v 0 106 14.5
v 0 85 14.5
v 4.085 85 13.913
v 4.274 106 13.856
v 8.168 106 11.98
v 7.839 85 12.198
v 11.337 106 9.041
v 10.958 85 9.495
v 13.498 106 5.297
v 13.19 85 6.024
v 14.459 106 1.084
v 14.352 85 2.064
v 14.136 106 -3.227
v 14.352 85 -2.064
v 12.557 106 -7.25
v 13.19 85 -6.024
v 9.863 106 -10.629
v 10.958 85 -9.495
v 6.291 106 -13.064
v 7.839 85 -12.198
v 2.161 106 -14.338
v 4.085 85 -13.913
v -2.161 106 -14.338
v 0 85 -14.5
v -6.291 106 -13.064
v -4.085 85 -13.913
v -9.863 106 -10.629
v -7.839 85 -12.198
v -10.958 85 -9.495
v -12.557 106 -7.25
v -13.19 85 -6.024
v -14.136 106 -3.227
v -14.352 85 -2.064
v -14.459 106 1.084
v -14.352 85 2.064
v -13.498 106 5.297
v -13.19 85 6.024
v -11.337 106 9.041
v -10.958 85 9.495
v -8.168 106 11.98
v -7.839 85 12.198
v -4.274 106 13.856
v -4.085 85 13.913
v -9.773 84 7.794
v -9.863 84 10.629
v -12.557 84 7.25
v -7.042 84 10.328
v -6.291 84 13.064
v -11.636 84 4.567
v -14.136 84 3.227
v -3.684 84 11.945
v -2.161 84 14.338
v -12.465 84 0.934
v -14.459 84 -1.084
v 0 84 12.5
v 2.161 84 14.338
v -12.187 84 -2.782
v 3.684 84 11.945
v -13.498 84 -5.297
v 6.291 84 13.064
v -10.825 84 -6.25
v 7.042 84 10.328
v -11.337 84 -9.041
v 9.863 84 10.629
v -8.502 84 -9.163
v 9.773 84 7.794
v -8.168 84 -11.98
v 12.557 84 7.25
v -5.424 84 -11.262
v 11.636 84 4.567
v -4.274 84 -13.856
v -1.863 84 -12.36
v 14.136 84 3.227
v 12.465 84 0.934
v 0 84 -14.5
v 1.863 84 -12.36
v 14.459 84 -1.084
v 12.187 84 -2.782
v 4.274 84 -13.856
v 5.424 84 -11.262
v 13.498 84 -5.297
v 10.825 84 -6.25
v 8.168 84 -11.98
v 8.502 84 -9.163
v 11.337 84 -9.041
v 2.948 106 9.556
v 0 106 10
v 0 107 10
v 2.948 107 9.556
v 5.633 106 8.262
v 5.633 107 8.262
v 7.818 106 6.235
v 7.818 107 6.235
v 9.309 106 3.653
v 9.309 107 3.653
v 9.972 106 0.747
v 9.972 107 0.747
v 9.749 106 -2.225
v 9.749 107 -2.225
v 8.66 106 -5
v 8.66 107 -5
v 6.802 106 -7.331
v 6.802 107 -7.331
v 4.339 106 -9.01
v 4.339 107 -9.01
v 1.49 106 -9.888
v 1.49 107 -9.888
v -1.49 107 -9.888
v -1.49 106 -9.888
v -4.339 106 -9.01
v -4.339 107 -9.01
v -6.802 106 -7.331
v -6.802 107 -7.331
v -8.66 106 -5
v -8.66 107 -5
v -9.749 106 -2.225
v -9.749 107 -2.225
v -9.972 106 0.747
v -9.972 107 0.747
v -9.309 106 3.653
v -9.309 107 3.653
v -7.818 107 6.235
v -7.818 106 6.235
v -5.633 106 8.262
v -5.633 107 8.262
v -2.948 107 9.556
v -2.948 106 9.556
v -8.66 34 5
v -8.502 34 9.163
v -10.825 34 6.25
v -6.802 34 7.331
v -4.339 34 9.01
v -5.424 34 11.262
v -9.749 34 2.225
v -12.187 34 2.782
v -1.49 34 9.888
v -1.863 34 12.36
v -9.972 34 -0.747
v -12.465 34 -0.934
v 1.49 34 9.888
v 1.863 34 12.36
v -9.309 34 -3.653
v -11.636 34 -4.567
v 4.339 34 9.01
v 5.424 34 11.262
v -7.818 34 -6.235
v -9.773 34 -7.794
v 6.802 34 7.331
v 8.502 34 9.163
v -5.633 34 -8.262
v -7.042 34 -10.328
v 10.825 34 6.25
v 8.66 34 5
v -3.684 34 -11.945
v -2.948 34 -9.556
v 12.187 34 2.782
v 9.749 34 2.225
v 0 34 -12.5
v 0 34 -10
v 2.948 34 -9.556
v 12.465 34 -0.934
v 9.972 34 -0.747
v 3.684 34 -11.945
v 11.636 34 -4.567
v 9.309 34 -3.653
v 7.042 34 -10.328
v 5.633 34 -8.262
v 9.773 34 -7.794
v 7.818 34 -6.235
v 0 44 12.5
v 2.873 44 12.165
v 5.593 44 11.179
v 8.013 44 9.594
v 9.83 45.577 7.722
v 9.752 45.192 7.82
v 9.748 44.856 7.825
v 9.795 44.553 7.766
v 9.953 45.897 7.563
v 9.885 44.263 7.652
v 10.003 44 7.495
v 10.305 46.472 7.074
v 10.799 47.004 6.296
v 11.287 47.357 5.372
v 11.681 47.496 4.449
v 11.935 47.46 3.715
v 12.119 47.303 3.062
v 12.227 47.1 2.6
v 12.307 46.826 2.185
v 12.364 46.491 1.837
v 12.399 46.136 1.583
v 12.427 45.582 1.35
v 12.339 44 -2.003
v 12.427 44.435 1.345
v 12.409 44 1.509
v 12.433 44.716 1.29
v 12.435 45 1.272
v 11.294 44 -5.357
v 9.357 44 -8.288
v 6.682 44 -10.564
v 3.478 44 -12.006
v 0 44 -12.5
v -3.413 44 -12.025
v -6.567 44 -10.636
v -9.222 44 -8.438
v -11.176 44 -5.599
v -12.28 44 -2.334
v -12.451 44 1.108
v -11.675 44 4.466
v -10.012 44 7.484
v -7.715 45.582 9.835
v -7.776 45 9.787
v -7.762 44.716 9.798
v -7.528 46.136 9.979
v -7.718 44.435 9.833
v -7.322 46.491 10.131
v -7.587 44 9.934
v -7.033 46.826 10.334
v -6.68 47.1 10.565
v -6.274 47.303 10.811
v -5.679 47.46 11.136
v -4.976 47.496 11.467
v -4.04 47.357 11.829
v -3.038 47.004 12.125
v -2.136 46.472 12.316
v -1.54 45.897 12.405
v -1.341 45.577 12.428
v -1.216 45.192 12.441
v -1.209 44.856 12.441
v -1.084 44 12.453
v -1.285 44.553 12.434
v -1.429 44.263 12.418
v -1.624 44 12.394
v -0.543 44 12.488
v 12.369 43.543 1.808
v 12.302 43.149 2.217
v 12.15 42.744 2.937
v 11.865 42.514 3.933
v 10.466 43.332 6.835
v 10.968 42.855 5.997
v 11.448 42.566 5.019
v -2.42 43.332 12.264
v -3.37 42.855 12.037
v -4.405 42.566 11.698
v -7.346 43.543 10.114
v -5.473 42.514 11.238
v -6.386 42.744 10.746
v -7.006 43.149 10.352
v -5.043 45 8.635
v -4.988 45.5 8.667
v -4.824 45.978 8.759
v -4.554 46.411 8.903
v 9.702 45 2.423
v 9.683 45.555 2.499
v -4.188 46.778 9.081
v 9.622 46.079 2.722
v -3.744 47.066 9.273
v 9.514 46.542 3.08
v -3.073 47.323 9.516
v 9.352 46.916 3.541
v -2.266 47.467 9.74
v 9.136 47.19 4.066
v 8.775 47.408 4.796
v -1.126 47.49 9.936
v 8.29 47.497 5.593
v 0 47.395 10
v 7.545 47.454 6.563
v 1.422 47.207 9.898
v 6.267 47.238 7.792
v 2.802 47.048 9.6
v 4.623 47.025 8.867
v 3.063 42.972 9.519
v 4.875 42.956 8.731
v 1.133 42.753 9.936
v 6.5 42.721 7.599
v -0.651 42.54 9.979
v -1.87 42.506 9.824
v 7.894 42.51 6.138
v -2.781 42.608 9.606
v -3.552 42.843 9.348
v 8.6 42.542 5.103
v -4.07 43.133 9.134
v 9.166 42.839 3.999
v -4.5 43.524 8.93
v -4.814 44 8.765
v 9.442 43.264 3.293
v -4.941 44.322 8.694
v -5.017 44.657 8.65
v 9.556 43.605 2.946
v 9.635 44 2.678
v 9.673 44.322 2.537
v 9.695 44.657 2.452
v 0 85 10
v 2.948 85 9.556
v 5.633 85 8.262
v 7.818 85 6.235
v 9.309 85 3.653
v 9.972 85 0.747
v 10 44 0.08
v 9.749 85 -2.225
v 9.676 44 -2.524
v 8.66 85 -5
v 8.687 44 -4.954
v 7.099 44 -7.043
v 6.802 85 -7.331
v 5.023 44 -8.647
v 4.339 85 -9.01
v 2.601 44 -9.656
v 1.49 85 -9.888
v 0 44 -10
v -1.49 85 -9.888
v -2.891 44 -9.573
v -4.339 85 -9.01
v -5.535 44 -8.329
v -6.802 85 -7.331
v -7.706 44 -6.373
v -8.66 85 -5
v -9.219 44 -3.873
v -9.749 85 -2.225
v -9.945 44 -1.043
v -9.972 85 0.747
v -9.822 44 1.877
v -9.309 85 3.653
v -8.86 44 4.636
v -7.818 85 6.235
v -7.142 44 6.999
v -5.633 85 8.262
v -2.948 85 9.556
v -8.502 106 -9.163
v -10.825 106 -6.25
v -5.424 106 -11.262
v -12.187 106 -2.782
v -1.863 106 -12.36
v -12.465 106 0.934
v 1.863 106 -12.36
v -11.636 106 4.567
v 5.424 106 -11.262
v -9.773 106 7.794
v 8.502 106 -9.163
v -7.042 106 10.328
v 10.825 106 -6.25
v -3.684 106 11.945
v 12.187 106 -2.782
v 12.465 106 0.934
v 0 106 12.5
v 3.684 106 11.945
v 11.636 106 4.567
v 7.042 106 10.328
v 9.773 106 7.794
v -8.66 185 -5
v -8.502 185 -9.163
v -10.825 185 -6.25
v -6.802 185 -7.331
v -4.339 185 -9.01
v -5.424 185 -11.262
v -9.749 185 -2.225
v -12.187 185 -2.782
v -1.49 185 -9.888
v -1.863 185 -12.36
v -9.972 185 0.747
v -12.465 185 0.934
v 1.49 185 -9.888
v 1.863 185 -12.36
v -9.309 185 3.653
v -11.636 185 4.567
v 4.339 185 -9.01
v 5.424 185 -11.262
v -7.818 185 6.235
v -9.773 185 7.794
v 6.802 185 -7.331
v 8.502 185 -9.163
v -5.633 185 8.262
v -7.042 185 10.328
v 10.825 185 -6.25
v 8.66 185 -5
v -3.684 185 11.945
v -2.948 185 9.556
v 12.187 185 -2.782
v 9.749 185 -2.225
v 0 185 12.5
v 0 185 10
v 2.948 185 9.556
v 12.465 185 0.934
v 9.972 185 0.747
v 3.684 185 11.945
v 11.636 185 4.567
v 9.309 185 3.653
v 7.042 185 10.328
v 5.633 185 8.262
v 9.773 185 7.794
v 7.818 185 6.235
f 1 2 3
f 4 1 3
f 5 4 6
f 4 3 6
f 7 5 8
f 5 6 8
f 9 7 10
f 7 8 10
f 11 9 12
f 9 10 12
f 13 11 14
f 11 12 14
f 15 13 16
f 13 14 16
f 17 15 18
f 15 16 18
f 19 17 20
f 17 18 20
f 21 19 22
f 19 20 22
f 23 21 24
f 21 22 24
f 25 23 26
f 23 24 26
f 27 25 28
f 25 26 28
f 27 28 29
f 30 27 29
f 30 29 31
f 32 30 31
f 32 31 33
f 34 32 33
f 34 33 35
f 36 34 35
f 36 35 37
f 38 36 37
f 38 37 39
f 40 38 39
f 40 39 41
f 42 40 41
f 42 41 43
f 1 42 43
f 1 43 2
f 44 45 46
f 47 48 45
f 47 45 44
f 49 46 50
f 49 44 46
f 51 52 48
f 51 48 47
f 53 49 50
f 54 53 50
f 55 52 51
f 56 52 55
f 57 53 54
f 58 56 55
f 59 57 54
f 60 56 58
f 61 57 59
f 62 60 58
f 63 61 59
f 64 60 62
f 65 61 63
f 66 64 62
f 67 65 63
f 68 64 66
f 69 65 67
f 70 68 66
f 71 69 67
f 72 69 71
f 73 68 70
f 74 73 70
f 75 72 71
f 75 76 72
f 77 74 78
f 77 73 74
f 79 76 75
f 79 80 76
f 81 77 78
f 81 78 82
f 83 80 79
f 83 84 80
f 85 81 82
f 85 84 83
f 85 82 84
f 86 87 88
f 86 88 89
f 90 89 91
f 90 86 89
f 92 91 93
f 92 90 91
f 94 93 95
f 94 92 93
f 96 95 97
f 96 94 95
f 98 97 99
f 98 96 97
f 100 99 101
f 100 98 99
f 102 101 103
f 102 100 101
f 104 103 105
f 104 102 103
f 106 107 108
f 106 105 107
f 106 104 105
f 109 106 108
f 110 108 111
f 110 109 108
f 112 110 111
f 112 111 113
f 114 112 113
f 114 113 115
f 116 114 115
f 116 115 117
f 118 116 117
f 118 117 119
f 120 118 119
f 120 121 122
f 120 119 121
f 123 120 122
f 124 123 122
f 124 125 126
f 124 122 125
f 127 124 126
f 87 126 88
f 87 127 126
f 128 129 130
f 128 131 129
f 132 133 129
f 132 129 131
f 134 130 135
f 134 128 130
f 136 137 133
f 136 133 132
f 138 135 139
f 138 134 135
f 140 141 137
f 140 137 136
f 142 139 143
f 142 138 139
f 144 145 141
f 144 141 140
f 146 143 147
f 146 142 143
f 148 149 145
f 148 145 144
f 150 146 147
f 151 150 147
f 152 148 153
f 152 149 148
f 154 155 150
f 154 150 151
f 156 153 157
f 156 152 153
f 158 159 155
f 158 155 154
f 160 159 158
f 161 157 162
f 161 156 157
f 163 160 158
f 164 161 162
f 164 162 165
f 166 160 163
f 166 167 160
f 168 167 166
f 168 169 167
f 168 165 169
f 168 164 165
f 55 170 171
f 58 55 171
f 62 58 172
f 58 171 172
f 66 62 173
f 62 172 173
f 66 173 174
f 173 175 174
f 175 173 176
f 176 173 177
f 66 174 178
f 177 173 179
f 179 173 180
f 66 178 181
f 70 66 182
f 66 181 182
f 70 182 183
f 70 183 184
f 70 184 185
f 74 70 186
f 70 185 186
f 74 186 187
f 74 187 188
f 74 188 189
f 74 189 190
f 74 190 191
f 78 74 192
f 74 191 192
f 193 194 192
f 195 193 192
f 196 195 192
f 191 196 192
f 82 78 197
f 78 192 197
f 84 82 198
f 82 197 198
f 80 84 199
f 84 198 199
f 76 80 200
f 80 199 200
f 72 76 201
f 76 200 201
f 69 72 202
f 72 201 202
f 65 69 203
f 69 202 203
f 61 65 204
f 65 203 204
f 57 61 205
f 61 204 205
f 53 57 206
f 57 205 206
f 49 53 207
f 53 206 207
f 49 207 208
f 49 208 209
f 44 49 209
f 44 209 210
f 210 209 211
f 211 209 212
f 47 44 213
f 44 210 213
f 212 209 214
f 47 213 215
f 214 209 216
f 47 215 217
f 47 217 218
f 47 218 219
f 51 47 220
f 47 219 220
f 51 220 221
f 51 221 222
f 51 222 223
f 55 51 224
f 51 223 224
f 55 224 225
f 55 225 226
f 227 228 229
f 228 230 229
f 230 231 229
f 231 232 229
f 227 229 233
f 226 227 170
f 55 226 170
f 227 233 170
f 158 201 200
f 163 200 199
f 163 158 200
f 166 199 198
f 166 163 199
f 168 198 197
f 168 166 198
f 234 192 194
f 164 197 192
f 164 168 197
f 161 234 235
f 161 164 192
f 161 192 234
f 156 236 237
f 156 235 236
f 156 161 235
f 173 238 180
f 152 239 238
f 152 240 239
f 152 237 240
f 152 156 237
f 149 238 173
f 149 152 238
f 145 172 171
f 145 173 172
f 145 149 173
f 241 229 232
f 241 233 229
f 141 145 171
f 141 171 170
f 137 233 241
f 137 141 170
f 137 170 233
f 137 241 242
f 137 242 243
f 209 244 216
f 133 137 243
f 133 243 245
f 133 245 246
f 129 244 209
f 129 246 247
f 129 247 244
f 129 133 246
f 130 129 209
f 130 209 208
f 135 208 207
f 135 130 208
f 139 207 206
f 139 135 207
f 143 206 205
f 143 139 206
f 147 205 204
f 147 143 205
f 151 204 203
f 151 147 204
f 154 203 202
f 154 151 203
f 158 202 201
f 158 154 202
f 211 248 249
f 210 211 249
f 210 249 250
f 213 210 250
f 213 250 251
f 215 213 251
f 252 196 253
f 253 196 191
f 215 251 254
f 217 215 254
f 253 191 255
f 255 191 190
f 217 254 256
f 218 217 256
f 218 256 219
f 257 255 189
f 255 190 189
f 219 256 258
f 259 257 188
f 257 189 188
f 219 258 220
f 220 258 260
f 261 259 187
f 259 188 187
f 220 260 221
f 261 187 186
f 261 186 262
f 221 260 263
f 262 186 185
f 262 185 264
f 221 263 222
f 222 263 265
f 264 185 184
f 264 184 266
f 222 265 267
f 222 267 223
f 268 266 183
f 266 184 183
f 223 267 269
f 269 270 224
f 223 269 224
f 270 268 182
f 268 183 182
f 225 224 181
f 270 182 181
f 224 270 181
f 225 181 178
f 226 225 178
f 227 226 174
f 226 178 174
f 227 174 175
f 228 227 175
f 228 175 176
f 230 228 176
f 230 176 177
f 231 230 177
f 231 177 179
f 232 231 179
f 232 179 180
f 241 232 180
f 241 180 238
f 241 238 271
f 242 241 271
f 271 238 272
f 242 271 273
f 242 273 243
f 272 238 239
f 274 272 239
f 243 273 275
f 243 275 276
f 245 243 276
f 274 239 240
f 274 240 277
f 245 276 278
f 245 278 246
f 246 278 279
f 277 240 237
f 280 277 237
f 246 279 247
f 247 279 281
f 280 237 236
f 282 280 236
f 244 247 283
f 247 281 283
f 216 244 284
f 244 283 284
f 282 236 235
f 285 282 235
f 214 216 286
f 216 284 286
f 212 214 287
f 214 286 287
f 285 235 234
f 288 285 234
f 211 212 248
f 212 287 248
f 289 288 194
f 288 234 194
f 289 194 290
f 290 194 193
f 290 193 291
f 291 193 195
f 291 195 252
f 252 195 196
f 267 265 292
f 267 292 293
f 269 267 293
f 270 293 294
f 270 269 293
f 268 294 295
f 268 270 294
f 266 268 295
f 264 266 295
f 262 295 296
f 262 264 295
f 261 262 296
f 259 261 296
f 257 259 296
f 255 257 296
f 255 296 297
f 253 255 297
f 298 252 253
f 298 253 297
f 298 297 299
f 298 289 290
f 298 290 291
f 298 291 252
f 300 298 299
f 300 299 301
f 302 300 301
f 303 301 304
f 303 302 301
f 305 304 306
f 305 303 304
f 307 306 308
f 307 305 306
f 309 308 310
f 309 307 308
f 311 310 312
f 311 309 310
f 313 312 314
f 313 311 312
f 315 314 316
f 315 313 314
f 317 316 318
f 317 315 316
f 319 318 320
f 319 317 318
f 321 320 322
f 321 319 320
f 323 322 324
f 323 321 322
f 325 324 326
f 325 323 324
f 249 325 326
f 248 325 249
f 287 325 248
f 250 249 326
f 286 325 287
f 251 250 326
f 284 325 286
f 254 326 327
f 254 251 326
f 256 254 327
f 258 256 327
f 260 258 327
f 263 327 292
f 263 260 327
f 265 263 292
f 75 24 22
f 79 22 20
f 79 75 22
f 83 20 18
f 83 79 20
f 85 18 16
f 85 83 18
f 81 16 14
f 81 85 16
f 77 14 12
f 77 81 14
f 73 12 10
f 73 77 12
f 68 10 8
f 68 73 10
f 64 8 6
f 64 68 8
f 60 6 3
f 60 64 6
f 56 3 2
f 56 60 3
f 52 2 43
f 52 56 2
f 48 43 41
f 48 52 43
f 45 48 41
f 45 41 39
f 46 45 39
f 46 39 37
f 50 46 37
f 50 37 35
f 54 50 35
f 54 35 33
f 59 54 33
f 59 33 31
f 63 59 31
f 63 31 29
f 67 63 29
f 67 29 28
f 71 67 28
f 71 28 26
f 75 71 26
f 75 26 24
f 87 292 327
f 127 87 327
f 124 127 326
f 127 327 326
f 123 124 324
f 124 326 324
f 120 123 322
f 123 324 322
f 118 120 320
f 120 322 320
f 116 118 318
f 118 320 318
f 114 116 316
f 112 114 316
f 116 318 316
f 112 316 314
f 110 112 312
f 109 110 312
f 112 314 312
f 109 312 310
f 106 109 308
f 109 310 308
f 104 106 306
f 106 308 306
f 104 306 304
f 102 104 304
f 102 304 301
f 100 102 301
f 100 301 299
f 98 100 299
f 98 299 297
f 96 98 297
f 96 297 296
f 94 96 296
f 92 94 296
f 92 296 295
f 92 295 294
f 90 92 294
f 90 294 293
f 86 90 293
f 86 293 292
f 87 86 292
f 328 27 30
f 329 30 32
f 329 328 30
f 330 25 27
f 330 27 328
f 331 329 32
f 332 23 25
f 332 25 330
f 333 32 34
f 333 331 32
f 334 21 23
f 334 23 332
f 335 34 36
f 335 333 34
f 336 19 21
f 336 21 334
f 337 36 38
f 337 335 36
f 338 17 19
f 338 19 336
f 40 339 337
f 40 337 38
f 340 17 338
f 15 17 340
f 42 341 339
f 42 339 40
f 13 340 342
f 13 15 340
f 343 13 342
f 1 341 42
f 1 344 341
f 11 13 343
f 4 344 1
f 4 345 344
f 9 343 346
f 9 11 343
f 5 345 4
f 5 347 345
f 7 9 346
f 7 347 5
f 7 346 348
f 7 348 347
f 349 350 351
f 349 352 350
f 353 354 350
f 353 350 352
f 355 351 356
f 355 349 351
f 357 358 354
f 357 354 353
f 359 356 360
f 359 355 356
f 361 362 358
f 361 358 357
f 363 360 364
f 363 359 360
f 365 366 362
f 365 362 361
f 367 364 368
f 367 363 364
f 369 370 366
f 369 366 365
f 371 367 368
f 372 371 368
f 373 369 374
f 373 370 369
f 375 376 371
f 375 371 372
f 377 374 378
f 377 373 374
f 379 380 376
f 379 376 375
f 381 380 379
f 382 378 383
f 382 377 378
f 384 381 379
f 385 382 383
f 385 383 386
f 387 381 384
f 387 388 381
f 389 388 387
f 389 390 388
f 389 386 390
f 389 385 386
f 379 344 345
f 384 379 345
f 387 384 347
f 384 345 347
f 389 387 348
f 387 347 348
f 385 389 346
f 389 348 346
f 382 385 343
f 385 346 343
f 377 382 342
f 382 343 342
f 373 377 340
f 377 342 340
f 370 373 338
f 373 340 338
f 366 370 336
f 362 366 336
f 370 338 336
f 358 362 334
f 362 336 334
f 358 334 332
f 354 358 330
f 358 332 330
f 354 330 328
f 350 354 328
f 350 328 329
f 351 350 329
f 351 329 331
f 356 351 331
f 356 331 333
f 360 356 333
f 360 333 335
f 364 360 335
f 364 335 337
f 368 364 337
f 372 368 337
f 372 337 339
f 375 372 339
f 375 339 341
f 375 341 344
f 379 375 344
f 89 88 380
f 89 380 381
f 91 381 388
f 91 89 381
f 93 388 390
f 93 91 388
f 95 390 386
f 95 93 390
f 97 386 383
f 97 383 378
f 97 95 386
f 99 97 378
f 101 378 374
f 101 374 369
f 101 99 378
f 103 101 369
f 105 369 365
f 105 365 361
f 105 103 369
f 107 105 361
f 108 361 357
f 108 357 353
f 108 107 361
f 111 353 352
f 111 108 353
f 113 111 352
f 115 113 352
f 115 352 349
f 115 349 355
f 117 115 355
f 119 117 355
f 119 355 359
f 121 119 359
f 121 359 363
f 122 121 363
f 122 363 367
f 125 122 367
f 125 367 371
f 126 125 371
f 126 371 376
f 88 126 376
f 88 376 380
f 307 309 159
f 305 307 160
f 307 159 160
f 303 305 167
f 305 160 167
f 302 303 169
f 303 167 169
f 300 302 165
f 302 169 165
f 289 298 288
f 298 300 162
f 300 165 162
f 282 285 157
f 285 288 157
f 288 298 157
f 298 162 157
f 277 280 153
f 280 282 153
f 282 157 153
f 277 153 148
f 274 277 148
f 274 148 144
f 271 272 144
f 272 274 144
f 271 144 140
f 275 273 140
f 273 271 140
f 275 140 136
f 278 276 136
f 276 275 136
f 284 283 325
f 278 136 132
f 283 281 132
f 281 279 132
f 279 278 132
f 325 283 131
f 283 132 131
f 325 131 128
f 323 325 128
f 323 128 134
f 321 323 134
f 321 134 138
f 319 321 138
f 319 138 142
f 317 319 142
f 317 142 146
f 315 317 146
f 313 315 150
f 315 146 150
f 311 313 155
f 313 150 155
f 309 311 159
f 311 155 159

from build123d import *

# Parameters (mm, degrees)
SKETCH1_R                = 12.5
SKETCH1_R_2              = 10
BOSS_EXTRUDE1_DEPTH      = 100
BOSS_EXTRUDE2_DEPTH      = 85
BOSS_EXTRUDE2_DEPTH_BACK = 4
SKETCH6_R                = 12.5
SKETCH6_R_2              = 10
BOSS_EXTRUDE3_START      = -84
SKETCH7_R                = 14.5
SKETCH7_R_2              = 10
BOSS_EXTRUDE3_DEPTH      = 1
CUT_EXTRUDE1_DEPTH       = 187.133016953
CUT_EXTRUDE1_DEPTH_BACK  = 187.133016953
SKETCH11_W               = 35.010034018
SKETCH11_H               = 2.4
CUT_EXTRUDE3_DEPTH       = 187.133016953
CUT_EXTRUDE3_DEPTH_BACK  = 187.133016953
SKETCH13_W               = 31.609051685
SKETCH13_H               = 42.8
SKETCH14_R               = 14.5
BOSS_EXTRUDE4_DEPTH      = 21
SKETCH15_R               = 10
CUT_EXTRUDE4_DEPTH       = 22
BOSS_EXTRUDE5_START      = 10
SKETCH17_R               = 12.5
SKETCH17_R_2             = 10
BOSS_EXTRUDE5_DEPTH      = 10
SKETCH18_R               = 2.5
CUT_EXTRUDE5_DEPTH       = 54


with BuildPart() as part:
    # Sketch1 → Boss-Extrude1 (new body)
    with BuildSketch(Plane(origin=(0, 0, 0), x_dir=(1, 0, 0), z_dir=(0, 1, 0))):
        Circle(SKETCH1_R)
        Circle(SKETCH1_R_2, mode=Mode.SUBTRACT)
    extrude(amount=BOSS_EXTRUDE1_DEPTH)

    # Sketch6 → Boss-Extrude2 (add, two sides: drawn at the far end of the back side and taken through both)
    with BuildSketch(Plane(origin=(0, 100, 0), x_dir=(1, 0, 0), z_dir=(0, 1, 0)).offset(-BOSS_EXTRUDE2_DEPTH_BACK)):
        Circle(SKETCH6_R)
        Circle(SKETCH6_R_2, mode=Mode.SUBTRACT)
    extrude(amount=BOSS_EXTRUDE2_DEPTH + BOSS_EXTRUDE2_DEPTH_BACK)

    # Sketch7 → Boss-Extrude3 (add)
    with BuildSketch(Plane.XZ.offset(BOSS_EXTRUDE3_START)):
        Circle(SKETCH7_R)
        Circle(SKETCH7_R_2, mode=Mode.SUBTRACT)
    extrude(amount=-BOSS_EXTRUDE3_DEPTH)

    # Sketch11 → Cut-Extrude1 (cut, two sides: drawn at the far end of the back side and taken through both)
    with BuildSketch(Plane(origin=(0, 0, 0), x_dir=(0, 0, -1), z_dir=(1, 0, 0)).offset(-CUT_EXTRUDE1_DEPTH_BACK)):
        Rectangle(SKETCH11_W, SKETCH11_H)
    extrude(amount=CUT_EXTRUDE1_DEPTH + CUT_EXTRUDE1_DEPTH_BACK, mode=Mode.SUBTRACT)

    # Sketch13 → Cut-Extrude3 (cut, two sides: drawn at the far end of the back side and taken through both)
    with BuildSketch(Plane.XY.offset(-CUT_EXTRUDE3_DEPTH_BACK)):
        with Locations((3.304525843, 22.6)):
            Rectangle(SKETCH13_W, SKETCH13_H)
    extrude(amount=CUT_EXTRUDE3_DEPTH + CUT_EXTRUDE3_DEPTH_BACK, mode=Mode.SUBTRACT)

    # Sketch14 → Boss-Extrude4 (add)
    with BuildSketch(Plane(origin=(0, 85, 0), x_dir=(1, 0, 0), z_dir=(0, 1, 0))):
        Circle(SKETCH14_R)
    extrude(amount=BOSS_EXTRUDE4_DEPTH)

    # Sketch15 → Cut-Extrude4 (cut)
    with BuildSketch(Plane.XZ.offset(-85)):
        Circle(SKETCH15_R)
    extrude(amount=-CUT_EXTRUDE4_DEPTH, mode=Mode.SUBTRACT)

    # Sketch17 → Boss-Extrude5 (add)
    with BuildSketch(Plane.XZ.offset(-44).offset(BOSS_EXTRUDE5_START)):
        Circle(SKETCH17_R)
        Circle(SKETCH17_R_2, mode=Mode.SUBTRACT)
    extrude(amount=-BOSS_EXTRUDE5_DEPTH)

    # Sketch18 → Cut-Extrude5 (cut)
    with BuildSketch(Plane(origin=(35.019010809, 0, -14.753605728), x_dir=(-0.38825278231327914, 1.212401304802914e-15, -0.9215529160205601), z_dir=(0.9215529160205602, -2.877743595734803e-15, -0.3882527823132792))):
        with Locations((-8.5, 45)):
            Circle(SKETCH18_R)
    extrude(amount=-CUT_EXTRUDE5_DEPTH, mode=Mode.SUBTRACT)


solid = part.part
